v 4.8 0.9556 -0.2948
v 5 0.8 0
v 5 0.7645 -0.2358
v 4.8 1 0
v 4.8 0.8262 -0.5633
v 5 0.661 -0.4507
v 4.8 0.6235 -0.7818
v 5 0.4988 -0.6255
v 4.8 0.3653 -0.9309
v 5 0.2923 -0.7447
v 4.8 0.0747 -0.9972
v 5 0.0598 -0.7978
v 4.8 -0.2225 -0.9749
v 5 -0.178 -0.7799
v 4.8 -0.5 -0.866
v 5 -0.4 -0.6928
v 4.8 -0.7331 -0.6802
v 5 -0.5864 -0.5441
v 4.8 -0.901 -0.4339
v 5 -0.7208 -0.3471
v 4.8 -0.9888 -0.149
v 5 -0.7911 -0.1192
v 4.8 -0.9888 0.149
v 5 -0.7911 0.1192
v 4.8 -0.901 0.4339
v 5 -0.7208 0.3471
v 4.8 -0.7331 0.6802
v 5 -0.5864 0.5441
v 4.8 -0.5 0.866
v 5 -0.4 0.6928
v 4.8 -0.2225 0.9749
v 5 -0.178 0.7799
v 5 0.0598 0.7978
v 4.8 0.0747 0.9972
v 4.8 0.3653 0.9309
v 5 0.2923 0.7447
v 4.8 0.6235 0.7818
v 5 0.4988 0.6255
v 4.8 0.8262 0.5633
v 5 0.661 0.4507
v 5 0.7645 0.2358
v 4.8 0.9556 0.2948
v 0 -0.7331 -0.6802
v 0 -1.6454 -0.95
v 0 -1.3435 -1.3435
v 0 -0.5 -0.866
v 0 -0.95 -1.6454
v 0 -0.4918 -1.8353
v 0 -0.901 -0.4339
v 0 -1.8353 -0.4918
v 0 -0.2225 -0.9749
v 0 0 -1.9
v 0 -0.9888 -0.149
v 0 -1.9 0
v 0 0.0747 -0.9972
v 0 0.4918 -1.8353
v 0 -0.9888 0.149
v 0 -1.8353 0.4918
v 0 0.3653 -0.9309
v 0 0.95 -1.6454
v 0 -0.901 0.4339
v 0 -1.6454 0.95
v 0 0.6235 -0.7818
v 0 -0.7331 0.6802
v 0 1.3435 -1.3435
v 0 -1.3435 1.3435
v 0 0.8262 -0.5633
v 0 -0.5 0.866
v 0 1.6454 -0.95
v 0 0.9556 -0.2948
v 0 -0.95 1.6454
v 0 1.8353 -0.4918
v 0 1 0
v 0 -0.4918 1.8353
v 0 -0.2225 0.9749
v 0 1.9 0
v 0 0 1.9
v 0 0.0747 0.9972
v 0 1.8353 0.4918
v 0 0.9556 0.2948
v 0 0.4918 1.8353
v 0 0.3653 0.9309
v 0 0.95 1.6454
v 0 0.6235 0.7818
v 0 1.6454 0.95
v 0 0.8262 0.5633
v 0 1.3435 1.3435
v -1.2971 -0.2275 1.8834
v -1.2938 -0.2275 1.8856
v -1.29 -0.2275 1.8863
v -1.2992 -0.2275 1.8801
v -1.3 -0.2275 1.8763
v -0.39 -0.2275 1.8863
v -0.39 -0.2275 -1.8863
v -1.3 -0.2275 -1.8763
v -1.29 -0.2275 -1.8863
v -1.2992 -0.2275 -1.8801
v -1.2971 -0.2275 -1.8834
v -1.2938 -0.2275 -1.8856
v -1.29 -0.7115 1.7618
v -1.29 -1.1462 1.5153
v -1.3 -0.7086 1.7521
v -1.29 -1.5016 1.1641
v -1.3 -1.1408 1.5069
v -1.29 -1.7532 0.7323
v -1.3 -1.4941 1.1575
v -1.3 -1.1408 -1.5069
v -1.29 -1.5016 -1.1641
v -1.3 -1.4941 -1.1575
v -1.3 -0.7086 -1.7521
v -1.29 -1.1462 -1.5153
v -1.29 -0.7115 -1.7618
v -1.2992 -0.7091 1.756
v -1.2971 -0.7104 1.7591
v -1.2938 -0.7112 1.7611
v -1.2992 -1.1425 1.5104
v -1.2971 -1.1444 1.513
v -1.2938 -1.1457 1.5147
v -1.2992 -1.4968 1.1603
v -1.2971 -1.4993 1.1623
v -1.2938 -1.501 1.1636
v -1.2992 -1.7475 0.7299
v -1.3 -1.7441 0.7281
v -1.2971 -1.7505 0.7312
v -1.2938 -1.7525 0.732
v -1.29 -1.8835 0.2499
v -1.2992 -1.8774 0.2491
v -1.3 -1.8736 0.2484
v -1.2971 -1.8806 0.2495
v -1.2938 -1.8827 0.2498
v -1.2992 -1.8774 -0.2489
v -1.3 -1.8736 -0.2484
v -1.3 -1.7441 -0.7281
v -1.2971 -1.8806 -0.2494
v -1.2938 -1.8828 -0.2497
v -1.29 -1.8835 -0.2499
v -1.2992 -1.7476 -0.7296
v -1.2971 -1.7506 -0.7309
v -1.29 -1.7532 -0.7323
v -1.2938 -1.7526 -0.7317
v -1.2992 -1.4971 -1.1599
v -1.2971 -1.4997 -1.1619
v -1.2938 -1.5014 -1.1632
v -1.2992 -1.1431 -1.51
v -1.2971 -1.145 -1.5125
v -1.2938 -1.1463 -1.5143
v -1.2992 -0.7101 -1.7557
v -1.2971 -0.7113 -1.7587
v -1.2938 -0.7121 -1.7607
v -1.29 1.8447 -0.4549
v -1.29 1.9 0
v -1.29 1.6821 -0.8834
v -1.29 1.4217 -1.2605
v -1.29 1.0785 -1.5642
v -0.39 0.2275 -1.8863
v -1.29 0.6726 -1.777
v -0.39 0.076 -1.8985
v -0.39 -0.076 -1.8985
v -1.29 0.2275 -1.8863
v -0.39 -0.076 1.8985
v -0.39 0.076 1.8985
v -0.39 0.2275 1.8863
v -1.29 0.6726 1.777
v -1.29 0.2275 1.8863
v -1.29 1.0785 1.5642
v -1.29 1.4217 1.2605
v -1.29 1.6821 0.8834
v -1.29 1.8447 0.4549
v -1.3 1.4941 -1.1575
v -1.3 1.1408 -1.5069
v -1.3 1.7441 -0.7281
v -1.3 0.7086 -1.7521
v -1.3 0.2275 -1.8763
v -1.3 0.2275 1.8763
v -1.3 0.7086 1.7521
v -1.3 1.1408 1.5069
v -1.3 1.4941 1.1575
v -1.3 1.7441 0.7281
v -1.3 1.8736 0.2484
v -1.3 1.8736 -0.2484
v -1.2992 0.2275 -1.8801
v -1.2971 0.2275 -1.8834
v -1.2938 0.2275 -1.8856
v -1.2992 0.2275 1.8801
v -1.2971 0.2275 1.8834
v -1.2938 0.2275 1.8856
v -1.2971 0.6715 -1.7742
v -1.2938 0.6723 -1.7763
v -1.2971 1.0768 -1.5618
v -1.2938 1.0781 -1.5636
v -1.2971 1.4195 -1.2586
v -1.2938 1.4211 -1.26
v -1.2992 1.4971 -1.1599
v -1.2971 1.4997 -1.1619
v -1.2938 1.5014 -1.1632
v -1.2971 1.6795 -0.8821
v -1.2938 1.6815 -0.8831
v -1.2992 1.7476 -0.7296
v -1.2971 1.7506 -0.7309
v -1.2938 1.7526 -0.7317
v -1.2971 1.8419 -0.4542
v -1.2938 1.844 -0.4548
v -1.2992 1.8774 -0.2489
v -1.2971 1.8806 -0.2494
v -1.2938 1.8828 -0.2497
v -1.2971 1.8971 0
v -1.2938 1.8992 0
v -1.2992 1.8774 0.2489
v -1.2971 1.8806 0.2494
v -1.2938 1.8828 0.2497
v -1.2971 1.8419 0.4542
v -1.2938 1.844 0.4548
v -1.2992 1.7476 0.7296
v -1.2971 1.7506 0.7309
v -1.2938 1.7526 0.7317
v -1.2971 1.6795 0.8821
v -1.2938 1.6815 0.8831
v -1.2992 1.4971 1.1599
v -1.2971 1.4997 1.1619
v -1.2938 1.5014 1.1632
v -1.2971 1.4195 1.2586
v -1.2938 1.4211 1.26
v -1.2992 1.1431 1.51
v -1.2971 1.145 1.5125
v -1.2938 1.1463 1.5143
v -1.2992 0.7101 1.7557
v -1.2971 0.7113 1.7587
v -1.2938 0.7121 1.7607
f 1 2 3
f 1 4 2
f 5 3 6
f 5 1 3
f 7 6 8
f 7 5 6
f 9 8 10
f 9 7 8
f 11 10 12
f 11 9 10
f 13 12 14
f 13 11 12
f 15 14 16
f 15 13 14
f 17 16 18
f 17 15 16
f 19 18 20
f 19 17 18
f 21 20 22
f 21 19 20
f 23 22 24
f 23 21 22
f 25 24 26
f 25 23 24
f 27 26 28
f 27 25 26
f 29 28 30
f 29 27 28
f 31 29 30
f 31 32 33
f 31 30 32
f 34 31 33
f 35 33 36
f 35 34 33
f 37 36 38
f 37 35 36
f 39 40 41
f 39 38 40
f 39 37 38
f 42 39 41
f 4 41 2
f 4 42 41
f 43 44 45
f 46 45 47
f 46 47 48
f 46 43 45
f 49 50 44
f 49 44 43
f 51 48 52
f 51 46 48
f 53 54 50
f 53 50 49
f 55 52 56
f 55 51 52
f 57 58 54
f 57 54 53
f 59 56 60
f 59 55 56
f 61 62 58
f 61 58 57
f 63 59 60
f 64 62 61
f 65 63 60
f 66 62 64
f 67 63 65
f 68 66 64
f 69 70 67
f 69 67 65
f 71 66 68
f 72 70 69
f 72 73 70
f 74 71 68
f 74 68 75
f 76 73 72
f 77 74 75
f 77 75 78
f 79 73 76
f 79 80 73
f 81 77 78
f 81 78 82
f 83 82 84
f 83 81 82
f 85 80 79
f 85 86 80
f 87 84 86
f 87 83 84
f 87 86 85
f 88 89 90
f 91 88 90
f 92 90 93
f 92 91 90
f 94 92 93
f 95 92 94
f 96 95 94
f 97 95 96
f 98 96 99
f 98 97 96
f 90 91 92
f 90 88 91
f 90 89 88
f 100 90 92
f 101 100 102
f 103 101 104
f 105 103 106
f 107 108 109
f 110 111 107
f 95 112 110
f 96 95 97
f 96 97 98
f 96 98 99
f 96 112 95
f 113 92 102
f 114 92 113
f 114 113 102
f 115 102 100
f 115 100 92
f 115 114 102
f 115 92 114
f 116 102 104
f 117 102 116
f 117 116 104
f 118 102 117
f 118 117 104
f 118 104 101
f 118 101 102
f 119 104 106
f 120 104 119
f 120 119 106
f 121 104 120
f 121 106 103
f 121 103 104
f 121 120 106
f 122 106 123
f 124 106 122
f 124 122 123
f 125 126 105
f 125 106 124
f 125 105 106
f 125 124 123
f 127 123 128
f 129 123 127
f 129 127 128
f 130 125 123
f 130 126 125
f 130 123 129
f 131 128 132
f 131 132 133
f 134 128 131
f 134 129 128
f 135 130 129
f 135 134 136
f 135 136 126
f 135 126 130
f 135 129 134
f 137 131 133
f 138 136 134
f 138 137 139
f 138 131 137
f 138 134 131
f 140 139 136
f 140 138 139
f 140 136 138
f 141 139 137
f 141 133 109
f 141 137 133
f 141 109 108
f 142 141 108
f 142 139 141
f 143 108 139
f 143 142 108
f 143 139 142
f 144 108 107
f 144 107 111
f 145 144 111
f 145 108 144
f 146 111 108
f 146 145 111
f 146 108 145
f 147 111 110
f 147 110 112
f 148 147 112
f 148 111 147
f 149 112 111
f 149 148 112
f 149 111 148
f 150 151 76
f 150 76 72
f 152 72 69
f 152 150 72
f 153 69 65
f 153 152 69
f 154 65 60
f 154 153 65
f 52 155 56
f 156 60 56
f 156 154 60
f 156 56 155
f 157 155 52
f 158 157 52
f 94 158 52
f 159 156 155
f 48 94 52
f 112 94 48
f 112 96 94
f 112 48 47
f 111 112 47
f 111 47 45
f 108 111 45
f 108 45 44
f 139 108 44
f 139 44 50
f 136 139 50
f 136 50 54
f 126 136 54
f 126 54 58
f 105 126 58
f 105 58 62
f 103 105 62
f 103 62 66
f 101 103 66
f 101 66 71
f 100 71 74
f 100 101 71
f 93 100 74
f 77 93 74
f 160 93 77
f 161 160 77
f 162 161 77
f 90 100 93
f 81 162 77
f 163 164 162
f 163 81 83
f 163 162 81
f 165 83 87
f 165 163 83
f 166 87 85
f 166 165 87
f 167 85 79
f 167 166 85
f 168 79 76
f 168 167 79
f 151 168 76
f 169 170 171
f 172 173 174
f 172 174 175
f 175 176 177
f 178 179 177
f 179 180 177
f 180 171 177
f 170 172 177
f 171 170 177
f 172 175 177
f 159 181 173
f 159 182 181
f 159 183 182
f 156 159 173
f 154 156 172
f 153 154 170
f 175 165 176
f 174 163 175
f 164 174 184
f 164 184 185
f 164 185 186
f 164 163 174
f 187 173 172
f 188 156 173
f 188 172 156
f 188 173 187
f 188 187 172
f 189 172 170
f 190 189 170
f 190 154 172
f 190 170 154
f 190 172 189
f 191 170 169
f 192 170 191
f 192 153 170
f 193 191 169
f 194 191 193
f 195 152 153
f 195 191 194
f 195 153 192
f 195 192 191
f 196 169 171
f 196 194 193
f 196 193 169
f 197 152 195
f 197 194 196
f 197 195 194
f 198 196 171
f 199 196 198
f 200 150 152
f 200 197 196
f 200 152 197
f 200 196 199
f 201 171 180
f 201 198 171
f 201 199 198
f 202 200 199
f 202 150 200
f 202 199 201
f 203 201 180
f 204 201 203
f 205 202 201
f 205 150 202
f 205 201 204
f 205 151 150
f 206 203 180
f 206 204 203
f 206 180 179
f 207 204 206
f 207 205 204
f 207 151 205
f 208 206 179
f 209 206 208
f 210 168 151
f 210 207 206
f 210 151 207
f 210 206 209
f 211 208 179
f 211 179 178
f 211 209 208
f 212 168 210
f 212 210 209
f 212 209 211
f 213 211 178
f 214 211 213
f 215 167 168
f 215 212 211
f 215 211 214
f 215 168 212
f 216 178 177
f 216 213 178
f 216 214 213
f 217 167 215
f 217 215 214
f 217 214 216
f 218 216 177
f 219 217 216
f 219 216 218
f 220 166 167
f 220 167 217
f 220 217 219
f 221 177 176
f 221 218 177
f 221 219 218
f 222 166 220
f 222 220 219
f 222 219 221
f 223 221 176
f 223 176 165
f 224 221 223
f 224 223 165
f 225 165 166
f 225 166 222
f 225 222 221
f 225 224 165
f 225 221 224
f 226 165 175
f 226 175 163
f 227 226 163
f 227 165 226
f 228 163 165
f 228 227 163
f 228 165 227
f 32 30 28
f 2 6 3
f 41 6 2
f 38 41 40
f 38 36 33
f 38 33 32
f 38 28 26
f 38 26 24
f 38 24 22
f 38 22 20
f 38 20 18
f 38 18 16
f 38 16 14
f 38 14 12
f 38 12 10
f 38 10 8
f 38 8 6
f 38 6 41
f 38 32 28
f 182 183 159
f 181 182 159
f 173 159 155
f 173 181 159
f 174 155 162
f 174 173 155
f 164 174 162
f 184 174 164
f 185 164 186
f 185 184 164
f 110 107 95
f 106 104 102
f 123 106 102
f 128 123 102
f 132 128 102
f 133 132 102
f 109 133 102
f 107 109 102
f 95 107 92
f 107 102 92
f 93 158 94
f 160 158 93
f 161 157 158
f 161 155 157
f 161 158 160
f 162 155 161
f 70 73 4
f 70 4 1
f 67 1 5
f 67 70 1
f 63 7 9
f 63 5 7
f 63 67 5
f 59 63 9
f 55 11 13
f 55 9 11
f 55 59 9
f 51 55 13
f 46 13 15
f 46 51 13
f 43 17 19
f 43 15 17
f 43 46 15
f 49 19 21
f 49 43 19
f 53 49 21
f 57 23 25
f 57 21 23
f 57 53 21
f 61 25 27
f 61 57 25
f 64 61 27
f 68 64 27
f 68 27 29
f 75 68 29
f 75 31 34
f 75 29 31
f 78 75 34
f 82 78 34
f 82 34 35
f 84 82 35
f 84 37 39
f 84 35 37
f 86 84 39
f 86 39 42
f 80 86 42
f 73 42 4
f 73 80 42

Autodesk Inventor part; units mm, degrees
ref_plane "YZ Plane" through (0, 0, 0) normal (1, 0, 0) x (0, 1, 0)
ref_plane "XZ Plane" through (0, 0, 0) normal (0, 1, 0) x (-1, 0, 0)
sketch "Эскиз1" plane through (0, 0, 0) normal (0, 0, 1) x (1, 0, 0)
  line L0 (-1.3, 0) -> (5, 0)
  line L1 (5, 0) -> (5, 1)
  line L2 (5, 1) -> (0.4, 1)
  line L3 (0.4, 1) -> (0.1546, 1)
  line L4 (0.1546, 1) -> (0, 1)
  line L5 (0, 1) -> (0, 1.9)
  line L6 (-2.56, 0) -> (6.26, 0) projected
  line L7 (0, -0.38) -> (0, 2.28) projected
  line L8 (-1.3, 0) -> (-1.3, 1.9)
  line L9 (0, 1.9) -> (-1.3, 1.9)
  dimension "d0" = 5
  dimension "d1" = 4.6
  dimension "d2" = 0.2454
  dimension "d3" = 1.3
  dimension "d4" = 2
  dimension "d5" = 2
  dimension "d9" = 3.8
  dimension "d10" = 0
revolve "Базовый элемент" add sketch "Эскиз1" angle 360 about axis through (-1.3, 0, 0) along (1, 0, 0)
sketch "Эскиз2" plane through (-1.3, 0, 0) normal (-1, 0, 0) x (0, 0, 1)
  circle A0 centre (0, 0) radius 1.9 projected
  line L0 (0, 0) -> (0, 1.9) projected
  line L1 (-1.9, 0.2275) -> (1.9, 0.2275)
  line L2 (1.9, 0.2275) -> (1.9, -0.2275)
  line L3 (1.9, -0.2275) -> (-1.9, -0.2275)
  line L4 (-1.9, -0.2275) -> (-1.9, 0.2275)
  line L5 (-1.9, 0) -> (1.9, 0) construction
  line L6 (0, 0.2275) -> (0, -0.2275) construction
  dimension "d11" = 0.455
  dimension "d12" = 3.8
fillet "Сопряжение1" radius 0.01 1 edges at (-1.3, -1.9, 0)
extrude "Паз" cut sketch "Эскиз2" against normal blind 0.91 contours A0 L3 L1 | L2 L3 A0 | A0 L1 L2 | L3 L4 A0 | A0 L4 L1
thread "Резьба" size "M2x0.4" class "6g" standard "ISO Metric profile" length 4.6
chamfer "Chamfer4" distance 0.2 angle 45 1 edges at (5, -1, 0)
ref_plane "Work Plane1" through (30.1625, 0, 0) normal (0, 0, -1) x (1, 0, 0)
equation "\"d11\" = SBR"
equation "\"d12\" = KOD"
equation "\"d13\" = RR"
equation "\"d16\" = STI"
equation "\"d14\" = GEL"
equation "\"d40\" = 0.1 * GD"
equation "\"d0\" = NLG"
equation "\"d1\" = GEL"
equation "\"d2\" = GAL"
equation "\"d3\" = KOH"
equation "\"d4\" = GD"
equation "\"d5\" = BDM"
equation "\"d9\" = KOD"
equation "\"GD\" = NND"
equation "\"NLG\" = 5"
equation "\"GEL\" = 4.6"
equation "\"KOD\" = 3.8"
equation "\"KOH\" = 1.3"
equation "\"GAL\" = 0.61345 * PTC"
equation "\"BDM\" = NND"
equation "\"RR\" = 0.01"
equation "\"SBR\" = 0.455"
equation "\"STI\" = 0.91"
equation "\"KEWI\" = 0"
equation "\"GUL\" = 0.61345 * PTC"
equation "\"SPD\" = NND - 1.2269 * PTC"
equation "\"PTC\" = 0.4"
equation "\"THREADDIA\" = 2"
equation "\"TOA\" = 30deg"
equation "\"FAWI\" = 45deg"
equation "\"NND\" = 2"
equation "\"GD1\" = THREADDIA - 1.2269 * PTC"
properties part number "Винт M2-6gx5 ГОСТ 1491-80" material "Сталь, мягкая"
